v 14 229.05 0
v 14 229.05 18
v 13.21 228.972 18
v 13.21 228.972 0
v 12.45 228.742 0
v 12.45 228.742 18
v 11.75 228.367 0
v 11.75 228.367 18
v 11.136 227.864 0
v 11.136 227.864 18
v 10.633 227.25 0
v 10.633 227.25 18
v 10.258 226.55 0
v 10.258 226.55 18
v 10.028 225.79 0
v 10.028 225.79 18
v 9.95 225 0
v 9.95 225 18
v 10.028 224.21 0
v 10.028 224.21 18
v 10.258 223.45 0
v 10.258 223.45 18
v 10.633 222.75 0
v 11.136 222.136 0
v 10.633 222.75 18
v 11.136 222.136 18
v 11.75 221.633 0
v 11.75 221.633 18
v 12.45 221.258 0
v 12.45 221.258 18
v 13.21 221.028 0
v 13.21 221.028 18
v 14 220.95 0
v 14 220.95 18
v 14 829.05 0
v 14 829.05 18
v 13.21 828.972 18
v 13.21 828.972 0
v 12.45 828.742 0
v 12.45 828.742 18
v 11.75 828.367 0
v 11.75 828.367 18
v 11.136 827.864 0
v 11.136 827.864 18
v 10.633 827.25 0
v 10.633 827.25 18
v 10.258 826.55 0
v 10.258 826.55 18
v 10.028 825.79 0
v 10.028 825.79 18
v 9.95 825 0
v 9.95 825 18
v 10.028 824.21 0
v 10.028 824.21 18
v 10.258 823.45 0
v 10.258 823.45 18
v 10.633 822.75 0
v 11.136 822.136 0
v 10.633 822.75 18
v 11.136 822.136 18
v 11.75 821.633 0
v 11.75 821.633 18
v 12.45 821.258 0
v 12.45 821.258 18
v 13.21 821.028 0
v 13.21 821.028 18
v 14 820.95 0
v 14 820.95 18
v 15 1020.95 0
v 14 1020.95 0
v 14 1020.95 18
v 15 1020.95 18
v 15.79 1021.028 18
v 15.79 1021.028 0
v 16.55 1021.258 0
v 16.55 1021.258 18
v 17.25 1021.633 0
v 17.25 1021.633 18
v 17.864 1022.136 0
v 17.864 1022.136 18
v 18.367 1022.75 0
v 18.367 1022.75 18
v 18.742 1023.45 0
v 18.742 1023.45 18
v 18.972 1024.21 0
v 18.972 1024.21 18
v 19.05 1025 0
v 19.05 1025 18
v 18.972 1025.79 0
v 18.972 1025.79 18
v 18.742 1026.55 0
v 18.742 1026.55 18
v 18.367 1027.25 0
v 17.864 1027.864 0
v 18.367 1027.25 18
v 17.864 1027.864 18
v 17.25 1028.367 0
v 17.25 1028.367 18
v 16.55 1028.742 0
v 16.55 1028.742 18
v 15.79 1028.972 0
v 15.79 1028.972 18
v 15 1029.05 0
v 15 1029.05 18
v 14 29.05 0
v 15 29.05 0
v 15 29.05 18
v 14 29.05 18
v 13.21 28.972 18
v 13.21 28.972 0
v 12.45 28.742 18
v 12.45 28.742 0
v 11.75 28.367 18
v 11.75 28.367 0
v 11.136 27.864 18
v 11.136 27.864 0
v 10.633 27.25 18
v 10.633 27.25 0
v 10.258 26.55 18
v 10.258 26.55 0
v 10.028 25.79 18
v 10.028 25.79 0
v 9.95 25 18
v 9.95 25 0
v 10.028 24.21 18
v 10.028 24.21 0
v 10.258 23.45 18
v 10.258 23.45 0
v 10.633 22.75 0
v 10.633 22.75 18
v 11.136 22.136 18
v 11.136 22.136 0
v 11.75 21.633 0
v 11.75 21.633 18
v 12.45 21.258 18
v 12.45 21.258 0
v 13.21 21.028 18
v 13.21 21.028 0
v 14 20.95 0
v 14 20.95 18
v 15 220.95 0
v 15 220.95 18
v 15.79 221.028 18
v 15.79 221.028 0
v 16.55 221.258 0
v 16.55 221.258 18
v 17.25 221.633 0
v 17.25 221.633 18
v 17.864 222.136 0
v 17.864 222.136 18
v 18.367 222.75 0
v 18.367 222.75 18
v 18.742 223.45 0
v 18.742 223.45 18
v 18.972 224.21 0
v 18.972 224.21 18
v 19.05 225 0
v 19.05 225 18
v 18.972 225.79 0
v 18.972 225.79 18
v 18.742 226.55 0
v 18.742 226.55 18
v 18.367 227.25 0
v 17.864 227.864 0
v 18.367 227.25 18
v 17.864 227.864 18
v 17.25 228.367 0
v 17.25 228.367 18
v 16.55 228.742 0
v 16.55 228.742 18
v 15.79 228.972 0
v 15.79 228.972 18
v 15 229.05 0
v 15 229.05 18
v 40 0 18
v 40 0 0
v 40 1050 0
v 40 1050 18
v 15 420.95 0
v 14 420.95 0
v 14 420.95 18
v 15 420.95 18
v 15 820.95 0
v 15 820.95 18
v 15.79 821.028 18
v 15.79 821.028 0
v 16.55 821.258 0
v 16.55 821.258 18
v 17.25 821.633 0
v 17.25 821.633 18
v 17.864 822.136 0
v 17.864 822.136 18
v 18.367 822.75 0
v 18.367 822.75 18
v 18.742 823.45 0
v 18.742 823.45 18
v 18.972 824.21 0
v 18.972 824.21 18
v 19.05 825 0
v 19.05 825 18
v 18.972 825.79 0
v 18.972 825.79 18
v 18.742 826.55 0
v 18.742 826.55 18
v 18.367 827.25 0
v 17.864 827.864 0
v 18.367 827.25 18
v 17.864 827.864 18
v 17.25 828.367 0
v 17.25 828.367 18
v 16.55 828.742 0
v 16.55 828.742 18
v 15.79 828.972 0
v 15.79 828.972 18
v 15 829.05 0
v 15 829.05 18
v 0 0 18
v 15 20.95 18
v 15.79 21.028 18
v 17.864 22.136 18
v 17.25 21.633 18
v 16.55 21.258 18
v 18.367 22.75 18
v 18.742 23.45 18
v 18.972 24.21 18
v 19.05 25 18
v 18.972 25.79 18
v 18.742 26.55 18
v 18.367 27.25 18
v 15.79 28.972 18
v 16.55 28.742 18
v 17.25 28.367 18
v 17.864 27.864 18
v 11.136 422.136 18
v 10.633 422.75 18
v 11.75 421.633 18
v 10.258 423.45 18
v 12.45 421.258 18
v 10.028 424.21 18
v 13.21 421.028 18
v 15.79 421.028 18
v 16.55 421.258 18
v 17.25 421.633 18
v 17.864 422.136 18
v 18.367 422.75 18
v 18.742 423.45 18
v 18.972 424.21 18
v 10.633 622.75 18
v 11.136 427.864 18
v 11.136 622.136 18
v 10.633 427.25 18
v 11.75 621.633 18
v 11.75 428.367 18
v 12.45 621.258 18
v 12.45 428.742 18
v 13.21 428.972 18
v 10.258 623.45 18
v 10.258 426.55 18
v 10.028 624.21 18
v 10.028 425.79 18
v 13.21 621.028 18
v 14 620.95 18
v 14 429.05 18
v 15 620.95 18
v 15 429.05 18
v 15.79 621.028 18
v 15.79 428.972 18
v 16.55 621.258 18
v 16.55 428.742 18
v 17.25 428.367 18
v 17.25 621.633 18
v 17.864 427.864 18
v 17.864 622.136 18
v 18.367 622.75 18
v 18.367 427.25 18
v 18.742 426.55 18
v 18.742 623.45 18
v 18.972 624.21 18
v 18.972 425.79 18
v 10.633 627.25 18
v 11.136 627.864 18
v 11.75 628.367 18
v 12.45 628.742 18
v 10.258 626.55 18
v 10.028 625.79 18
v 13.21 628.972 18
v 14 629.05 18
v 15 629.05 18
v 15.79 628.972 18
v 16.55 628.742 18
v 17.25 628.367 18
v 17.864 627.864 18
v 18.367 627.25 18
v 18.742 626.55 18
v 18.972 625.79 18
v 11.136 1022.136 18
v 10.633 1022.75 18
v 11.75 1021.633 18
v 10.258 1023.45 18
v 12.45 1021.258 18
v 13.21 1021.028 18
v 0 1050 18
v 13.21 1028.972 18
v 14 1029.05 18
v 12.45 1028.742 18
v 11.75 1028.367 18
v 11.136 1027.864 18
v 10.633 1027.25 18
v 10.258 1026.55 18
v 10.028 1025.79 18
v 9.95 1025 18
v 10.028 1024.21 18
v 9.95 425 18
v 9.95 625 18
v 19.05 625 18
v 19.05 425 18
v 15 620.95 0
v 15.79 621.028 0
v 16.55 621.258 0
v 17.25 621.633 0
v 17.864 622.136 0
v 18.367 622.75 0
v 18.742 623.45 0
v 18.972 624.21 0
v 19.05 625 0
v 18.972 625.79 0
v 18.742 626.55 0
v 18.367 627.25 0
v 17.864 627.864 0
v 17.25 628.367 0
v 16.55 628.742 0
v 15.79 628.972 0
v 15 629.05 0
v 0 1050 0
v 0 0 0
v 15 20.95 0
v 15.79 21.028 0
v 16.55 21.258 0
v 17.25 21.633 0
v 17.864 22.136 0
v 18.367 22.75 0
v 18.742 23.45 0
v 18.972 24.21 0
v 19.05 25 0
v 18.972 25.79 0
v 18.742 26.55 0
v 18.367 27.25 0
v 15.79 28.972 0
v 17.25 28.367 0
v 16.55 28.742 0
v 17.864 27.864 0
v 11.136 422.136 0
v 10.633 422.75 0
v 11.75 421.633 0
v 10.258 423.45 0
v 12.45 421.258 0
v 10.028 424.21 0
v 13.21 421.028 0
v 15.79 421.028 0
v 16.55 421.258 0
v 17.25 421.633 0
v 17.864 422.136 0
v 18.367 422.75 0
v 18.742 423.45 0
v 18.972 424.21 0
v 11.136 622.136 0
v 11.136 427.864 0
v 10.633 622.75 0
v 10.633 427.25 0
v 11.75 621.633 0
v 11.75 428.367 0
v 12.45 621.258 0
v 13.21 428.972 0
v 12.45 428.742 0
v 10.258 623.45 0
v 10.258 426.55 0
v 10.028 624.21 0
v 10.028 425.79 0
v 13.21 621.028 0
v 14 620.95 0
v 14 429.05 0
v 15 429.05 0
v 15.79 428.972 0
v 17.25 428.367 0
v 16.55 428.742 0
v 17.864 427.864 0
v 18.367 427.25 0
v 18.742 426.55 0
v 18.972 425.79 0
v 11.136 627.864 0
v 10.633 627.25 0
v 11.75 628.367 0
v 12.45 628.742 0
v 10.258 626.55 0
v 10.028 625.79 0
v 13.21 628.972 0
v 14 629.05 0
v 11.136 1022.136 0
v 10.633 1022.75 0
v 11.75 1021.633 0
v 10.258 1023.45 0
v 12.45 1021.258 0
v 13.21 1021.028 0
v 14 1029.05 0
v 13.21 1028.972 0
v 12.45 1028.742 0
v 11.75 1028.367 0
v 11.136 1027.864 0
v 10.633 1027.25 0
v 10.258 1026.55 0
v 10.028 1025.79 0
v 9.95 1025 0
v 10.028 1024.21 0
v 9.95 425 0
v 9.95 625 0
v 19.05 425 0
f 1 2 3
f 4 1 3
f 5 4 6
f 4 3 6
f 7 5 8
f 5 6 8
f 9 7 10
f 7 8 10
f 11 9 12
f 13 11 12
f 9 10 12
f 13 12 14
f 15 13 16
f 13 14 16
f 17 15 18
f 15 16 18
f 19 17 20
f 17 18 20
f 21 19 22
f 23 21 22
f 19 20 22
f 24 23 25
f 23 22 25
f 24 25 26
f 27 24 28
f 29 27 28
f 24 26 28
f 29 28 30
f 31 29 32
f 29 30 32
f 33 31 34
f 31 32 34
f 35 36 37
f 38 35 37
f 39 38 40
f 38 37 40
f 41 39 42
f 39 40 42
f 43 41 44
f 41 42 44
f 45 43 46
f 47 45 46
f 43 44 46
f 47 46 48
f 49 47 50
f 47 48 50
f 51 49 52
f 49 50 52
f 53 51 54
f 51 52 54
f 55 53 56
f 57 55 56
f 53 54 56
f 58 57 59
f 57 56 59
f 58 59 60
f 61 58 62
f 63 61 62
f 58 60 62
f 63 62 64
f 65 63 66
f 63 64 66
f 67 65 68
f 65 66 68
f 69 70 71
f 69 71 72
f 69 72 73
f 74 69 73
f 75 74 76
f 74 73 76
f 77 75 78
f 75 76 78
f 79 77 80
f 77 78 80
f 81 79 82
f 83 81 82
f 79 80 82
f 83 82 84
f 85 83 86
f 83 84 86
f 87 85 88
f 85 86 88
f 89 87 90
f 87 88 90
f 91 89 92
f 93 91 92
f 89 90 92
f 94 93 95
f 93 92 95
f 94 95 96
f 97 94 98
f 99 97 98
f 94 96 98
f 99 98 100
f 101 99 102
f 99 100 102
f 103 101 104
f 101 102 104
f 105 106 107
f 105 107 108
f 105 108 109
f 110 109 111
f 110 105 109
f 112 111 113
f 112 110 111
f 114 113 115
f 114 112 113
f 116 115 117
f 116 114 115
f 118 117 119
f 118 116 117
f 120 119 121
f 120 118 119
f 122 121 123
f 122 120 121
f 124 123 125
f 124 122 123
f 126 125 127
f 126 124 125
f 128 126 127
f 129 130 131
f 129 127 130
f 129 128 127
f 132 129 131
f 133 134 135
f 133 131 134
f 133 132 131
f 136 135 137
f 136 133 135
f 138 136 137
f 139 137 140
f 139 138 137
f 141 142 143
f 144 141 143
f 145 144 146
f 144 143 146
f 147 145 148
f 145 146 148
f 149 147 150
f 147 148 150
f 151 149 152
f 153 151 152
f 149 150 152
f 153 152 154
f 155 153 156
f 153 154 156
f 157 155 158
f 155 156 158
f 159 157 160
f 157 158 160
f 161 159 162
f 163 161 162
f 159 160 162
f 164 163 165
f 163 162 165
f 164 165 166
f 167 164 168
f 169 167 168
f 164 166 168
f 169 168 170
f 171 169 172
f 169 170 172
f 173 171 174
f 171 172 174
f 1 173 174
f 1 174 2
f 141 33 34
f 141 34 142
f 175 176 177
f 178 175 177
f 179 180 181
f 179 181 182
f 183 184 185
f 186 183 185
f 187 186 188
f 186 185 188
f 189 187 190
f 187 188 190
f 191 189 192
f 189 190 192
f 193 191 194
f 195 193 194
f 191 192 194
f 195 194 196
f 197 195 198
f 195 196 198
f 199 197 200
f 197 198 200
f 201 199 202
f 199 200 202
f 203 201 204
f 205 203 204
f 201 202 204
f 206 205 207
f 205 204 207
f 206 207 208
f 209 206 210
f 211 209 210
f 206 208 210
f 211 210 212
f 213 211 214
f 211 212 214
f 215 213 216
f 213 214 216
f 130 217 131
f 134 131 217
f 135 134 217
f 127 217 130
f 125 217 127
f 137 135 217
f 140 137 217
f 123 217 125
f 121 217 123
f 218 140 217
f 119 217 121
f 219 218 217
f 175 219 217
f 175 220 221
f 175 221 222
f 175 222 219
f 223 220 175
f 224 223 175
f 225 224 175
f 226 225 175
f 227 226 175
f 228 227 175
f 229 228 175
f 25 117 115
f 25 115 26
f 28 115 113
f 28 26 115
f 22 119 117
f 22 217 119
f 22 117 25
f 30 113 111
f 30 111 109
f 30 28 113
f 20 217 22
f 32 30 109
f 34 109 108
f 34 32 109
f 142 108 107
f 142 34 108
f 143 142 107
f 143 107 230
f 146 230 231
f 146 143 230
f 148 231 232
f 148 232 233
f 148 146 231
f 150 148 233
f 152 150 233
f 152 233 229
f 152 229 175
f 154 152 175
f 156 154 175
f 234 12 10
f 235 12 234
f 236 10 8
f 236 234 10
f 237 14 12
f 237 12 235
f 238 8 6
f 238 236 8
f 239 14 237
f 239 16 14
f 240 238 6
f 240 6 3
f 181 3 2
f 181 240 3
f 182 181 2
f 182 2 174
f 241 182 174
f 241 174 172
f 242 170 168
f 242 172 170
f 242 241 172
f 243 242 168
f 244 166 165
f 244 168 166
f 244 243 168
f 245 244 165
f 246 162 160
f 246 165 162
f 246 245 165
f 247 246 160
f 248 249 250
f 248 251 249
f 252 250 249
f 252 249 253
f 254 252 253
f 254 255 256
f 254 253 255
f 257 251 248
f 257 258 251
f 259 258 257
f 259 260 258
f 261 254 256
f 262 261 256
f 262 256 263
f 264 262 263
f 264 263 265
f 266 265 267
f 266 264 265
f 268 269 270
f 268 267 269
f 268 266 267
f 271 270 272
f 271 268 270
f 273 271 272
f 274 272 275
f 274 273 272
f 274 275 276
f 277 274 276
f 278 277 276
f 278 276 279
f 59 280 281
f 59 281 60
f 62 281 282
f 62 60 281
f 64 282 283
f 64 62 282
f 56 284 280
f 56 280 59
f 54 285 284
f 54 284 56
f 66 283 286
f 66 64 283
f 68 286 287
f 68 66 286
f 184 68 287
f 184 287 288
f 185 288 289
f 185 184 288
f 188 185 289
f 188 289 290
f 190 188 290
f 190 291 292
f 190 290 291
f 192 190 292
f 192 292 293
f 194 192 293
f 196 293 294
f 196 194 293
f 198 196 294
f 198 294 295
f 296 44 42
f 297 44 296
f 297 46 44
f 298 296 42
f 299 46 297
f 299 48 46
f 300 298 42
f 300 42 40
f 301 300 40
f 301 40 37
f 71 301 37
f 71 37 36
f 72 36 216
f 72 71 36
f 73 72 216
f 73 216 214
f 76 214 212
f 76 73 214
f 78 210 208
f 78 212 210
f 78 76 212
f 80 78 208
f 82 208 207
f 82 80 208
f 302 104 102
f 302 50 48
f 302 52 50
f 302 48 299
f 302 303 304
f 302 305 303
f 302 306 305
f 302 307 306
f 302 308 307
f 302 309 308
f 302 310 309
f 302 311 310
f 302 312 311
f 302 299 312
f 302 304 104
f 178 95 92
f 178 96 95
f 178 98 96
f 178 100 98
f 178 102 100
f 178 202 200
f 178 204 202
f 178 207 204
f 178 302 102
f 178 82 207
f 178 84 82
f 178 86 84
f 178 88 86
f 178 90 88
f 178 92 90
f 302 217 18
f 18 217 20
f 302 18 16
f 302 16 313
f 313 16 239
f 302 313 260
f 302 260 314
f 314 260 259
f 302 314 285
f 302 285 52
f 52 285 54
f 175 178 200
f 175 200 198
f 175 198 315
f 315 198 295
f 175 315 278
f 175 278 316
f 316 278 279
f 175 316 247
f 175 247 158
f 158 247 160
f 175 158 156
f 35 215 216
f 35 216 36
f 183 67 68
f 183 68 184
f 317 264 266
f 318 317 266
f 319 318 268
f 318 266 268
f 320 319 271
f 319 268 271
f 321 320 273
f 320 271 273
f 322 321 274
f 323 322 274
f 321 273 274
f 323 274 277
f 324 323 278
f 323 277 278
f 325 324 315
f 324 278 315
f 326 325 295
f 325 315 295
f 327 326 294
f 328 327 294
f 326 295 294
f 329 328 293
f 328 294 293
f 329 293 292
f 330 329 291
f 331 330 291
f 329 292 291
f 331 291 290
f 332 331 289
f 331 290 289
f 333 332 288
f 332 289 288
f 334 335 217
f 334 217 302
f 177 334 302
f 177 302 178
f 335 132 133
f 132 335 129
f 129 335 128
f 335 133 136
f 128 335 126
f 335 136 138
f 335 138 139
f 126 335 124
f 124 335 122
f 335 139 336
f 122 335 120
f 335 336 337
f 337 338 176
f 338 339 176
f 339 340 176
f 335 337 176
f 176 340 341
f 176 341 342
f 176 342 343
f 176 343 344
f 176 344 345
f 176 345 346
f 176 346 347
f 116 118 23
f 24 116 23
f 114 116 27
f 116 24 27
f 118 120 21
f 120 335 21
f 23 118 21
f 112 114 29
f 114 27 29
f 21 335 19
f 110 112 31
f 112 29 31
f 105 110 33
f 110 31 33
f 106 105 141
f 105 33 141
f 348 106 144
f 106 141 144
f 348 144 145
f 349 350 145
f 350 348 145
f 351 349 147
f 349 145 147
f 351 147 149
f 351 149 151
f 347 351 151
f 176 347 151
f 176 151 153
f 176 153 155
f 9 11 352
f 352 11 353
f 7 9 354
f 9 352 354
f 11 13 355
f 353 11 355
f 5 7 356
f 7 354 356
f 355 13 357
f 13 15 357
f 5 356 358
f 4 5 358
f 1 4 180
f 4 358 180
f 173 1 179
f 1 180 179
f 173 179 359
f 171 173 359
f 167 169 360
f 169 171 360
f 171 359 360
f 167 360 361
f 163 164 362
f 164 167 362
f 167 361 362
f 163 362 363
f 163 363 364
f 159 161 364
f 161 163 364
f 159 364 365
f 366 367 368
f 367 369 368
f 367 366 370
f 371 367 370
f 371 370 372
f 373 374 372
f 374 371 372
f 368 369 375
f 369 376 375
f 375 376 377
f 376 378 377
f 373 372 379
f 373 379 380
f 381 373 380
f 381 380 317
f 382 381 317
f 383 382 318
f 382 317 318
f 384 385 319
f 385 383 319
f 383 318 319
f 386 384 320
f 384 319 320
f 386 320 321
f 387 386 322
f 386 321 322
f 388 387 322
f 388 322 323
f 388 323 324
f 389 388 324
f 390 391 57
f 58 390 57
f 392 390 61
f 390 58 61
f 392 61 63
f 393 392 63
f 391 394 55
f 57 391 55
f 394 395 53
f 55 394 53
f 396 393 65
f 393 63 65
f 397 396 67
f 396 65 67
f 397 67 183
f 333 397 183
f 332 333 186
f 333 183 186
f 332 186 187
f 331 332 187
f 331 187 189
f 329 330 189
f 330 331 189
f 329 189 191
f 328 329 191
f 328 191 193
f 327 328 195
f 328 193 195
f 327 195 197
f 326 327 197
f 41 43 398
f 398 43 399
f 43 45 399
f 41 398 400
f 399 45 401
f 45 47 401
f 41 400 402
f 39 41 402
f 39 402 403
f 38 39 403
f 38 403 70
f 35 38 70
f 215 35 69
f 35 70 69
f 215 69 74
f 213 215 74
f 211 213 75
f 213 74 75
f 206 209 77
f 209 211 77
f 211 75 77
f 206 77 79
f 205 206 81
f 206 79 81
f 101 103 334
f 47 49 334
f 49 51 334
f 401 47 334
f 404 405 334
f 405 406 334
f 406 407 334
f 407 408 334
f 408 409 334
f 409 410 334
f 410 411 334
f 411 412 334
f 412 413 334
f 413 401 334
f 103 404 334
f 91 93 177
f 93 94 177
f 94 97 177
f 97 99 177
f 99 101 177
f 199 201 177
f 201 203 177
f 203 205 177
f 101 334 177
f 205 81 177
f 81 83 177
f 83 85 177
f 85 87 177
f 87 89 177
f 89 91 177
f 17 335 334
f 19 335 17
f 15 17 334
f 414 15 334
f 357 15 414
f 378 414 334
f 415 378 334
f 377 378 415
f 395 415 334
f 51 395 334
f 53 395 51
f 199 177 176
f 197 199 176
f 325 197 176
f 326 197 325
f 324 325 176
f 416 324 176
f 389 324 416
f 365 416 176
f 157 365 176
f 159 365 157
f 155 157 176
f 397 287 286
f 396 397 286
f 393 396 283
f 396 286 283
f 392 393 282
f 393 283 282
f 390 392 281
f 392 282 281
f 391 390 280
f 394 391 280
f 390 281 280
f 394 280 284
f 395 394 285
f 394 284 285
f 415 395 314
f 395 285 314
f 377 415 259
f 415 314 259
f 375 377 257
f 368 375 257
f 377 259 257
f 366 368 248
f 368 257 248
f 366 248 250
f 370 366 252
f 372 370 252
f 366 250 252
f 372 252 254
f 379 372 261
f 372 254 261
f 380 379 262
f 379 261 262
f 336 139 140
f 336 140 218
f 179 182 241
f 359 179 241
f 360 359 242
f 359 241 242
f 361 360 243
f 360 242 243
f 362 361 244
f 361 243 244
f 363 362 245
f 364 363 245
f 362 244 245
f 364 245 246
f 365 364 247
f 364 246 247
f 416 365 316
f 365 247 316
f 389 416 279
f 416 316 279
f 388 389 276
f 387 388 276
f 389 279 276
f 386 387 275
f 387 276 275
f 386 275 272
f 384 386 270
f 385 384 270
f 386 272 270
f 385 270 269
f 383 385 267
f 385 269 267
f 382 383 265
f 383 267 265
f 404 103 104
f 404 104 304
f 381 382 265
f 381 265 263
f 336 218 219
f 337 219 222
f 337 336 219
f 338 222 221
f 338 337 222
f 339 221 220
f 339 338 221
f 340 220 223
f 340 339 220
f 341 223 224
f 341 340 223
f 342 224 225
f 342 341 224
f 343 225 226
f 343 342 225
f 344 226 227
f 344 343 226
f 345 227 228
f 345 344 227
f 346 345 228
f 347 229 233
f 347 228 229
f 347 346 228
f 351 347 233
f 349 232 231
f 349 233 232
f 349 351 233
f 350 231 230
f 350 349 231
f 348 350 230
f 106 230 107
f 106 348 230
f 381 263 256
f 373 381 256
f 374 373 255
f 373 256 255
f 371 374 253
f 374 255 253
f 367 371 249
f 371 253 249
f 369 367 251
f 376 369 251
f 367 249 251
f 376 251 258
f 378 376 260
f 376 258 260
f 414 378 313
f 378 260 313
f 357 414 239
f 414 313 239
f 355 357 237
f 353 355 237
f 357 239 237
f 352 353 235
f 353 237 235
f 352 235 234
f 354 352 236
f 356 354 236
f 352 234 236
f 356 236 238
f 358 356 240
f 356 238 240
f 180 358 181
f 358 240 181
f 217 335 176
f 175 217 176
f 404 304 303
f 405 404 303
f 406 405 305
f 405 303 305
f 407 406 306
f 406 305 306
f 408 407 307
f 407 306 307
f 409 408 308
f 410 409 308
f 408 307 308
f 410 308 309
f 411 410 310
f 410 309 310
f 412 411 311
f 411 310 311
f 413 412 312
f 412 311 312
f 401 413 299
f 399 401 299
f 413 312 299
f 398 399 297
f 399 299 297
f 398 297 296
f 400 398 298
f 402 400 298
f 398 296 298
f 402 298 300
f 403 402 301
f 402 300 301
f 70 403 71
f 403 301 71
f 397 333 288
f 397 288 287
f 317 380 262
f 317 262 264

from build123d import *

# Parameters (mm, degrees)
SKETCH_W            = 40
SKETCH_H            = 1050
PAD_DEPTH           = 18
POCKET_DEPTH        = 0.001
POCKET_DEPTH_BACK   = 18.001
LINEARPATTERN_COUNT = 10
LINEARPATTERN_PITCH = 200


with BuildPart() as part:
    # Sketch → Pad (new body)
    with BuildSketch(Plane.XY):
        with Locations((20, 525)):
            Rectangle(SKETCH_W, SKETCH_H)
    extrude(amount=PAD_DEPTH)

    # Sketch001 → Pocket (cut, two sides)
    with BuildSketch(Plane(origin=(14, 25, 0), x_dir=(1, 0, 0), z_dir=(0, 0, 1))) as pocket_sk:
        with BuildLine():
            ThreePointArc((0, 4.05), (-4.05, 0), (0, -4.05))
            Line((0, -4.05), (1, -4.05))
            ThreePointArc((1, -4.05), (5.05, 0), (1, 4.05))
            Line((1, 4.05), (0, 4.05))
        make_face()
    pocket = extrude(amount=-POCKET_DEPTH, mode=Mode.SUBTRACT) + extrude(pocket_sk.sketch, amount=POCKET_DEPTH_BACK, mode=Mode.SUBTRACT)

    # LinearPattern: Pocket ×10
    with Locations(*[(0, i * LINEARPATTERN_PITCH, 0) for i in range(1, LINEARPATTERN_COUNT)]):
        add(pocket, mode=Mode.SUBTRACT)


solid = part.part
